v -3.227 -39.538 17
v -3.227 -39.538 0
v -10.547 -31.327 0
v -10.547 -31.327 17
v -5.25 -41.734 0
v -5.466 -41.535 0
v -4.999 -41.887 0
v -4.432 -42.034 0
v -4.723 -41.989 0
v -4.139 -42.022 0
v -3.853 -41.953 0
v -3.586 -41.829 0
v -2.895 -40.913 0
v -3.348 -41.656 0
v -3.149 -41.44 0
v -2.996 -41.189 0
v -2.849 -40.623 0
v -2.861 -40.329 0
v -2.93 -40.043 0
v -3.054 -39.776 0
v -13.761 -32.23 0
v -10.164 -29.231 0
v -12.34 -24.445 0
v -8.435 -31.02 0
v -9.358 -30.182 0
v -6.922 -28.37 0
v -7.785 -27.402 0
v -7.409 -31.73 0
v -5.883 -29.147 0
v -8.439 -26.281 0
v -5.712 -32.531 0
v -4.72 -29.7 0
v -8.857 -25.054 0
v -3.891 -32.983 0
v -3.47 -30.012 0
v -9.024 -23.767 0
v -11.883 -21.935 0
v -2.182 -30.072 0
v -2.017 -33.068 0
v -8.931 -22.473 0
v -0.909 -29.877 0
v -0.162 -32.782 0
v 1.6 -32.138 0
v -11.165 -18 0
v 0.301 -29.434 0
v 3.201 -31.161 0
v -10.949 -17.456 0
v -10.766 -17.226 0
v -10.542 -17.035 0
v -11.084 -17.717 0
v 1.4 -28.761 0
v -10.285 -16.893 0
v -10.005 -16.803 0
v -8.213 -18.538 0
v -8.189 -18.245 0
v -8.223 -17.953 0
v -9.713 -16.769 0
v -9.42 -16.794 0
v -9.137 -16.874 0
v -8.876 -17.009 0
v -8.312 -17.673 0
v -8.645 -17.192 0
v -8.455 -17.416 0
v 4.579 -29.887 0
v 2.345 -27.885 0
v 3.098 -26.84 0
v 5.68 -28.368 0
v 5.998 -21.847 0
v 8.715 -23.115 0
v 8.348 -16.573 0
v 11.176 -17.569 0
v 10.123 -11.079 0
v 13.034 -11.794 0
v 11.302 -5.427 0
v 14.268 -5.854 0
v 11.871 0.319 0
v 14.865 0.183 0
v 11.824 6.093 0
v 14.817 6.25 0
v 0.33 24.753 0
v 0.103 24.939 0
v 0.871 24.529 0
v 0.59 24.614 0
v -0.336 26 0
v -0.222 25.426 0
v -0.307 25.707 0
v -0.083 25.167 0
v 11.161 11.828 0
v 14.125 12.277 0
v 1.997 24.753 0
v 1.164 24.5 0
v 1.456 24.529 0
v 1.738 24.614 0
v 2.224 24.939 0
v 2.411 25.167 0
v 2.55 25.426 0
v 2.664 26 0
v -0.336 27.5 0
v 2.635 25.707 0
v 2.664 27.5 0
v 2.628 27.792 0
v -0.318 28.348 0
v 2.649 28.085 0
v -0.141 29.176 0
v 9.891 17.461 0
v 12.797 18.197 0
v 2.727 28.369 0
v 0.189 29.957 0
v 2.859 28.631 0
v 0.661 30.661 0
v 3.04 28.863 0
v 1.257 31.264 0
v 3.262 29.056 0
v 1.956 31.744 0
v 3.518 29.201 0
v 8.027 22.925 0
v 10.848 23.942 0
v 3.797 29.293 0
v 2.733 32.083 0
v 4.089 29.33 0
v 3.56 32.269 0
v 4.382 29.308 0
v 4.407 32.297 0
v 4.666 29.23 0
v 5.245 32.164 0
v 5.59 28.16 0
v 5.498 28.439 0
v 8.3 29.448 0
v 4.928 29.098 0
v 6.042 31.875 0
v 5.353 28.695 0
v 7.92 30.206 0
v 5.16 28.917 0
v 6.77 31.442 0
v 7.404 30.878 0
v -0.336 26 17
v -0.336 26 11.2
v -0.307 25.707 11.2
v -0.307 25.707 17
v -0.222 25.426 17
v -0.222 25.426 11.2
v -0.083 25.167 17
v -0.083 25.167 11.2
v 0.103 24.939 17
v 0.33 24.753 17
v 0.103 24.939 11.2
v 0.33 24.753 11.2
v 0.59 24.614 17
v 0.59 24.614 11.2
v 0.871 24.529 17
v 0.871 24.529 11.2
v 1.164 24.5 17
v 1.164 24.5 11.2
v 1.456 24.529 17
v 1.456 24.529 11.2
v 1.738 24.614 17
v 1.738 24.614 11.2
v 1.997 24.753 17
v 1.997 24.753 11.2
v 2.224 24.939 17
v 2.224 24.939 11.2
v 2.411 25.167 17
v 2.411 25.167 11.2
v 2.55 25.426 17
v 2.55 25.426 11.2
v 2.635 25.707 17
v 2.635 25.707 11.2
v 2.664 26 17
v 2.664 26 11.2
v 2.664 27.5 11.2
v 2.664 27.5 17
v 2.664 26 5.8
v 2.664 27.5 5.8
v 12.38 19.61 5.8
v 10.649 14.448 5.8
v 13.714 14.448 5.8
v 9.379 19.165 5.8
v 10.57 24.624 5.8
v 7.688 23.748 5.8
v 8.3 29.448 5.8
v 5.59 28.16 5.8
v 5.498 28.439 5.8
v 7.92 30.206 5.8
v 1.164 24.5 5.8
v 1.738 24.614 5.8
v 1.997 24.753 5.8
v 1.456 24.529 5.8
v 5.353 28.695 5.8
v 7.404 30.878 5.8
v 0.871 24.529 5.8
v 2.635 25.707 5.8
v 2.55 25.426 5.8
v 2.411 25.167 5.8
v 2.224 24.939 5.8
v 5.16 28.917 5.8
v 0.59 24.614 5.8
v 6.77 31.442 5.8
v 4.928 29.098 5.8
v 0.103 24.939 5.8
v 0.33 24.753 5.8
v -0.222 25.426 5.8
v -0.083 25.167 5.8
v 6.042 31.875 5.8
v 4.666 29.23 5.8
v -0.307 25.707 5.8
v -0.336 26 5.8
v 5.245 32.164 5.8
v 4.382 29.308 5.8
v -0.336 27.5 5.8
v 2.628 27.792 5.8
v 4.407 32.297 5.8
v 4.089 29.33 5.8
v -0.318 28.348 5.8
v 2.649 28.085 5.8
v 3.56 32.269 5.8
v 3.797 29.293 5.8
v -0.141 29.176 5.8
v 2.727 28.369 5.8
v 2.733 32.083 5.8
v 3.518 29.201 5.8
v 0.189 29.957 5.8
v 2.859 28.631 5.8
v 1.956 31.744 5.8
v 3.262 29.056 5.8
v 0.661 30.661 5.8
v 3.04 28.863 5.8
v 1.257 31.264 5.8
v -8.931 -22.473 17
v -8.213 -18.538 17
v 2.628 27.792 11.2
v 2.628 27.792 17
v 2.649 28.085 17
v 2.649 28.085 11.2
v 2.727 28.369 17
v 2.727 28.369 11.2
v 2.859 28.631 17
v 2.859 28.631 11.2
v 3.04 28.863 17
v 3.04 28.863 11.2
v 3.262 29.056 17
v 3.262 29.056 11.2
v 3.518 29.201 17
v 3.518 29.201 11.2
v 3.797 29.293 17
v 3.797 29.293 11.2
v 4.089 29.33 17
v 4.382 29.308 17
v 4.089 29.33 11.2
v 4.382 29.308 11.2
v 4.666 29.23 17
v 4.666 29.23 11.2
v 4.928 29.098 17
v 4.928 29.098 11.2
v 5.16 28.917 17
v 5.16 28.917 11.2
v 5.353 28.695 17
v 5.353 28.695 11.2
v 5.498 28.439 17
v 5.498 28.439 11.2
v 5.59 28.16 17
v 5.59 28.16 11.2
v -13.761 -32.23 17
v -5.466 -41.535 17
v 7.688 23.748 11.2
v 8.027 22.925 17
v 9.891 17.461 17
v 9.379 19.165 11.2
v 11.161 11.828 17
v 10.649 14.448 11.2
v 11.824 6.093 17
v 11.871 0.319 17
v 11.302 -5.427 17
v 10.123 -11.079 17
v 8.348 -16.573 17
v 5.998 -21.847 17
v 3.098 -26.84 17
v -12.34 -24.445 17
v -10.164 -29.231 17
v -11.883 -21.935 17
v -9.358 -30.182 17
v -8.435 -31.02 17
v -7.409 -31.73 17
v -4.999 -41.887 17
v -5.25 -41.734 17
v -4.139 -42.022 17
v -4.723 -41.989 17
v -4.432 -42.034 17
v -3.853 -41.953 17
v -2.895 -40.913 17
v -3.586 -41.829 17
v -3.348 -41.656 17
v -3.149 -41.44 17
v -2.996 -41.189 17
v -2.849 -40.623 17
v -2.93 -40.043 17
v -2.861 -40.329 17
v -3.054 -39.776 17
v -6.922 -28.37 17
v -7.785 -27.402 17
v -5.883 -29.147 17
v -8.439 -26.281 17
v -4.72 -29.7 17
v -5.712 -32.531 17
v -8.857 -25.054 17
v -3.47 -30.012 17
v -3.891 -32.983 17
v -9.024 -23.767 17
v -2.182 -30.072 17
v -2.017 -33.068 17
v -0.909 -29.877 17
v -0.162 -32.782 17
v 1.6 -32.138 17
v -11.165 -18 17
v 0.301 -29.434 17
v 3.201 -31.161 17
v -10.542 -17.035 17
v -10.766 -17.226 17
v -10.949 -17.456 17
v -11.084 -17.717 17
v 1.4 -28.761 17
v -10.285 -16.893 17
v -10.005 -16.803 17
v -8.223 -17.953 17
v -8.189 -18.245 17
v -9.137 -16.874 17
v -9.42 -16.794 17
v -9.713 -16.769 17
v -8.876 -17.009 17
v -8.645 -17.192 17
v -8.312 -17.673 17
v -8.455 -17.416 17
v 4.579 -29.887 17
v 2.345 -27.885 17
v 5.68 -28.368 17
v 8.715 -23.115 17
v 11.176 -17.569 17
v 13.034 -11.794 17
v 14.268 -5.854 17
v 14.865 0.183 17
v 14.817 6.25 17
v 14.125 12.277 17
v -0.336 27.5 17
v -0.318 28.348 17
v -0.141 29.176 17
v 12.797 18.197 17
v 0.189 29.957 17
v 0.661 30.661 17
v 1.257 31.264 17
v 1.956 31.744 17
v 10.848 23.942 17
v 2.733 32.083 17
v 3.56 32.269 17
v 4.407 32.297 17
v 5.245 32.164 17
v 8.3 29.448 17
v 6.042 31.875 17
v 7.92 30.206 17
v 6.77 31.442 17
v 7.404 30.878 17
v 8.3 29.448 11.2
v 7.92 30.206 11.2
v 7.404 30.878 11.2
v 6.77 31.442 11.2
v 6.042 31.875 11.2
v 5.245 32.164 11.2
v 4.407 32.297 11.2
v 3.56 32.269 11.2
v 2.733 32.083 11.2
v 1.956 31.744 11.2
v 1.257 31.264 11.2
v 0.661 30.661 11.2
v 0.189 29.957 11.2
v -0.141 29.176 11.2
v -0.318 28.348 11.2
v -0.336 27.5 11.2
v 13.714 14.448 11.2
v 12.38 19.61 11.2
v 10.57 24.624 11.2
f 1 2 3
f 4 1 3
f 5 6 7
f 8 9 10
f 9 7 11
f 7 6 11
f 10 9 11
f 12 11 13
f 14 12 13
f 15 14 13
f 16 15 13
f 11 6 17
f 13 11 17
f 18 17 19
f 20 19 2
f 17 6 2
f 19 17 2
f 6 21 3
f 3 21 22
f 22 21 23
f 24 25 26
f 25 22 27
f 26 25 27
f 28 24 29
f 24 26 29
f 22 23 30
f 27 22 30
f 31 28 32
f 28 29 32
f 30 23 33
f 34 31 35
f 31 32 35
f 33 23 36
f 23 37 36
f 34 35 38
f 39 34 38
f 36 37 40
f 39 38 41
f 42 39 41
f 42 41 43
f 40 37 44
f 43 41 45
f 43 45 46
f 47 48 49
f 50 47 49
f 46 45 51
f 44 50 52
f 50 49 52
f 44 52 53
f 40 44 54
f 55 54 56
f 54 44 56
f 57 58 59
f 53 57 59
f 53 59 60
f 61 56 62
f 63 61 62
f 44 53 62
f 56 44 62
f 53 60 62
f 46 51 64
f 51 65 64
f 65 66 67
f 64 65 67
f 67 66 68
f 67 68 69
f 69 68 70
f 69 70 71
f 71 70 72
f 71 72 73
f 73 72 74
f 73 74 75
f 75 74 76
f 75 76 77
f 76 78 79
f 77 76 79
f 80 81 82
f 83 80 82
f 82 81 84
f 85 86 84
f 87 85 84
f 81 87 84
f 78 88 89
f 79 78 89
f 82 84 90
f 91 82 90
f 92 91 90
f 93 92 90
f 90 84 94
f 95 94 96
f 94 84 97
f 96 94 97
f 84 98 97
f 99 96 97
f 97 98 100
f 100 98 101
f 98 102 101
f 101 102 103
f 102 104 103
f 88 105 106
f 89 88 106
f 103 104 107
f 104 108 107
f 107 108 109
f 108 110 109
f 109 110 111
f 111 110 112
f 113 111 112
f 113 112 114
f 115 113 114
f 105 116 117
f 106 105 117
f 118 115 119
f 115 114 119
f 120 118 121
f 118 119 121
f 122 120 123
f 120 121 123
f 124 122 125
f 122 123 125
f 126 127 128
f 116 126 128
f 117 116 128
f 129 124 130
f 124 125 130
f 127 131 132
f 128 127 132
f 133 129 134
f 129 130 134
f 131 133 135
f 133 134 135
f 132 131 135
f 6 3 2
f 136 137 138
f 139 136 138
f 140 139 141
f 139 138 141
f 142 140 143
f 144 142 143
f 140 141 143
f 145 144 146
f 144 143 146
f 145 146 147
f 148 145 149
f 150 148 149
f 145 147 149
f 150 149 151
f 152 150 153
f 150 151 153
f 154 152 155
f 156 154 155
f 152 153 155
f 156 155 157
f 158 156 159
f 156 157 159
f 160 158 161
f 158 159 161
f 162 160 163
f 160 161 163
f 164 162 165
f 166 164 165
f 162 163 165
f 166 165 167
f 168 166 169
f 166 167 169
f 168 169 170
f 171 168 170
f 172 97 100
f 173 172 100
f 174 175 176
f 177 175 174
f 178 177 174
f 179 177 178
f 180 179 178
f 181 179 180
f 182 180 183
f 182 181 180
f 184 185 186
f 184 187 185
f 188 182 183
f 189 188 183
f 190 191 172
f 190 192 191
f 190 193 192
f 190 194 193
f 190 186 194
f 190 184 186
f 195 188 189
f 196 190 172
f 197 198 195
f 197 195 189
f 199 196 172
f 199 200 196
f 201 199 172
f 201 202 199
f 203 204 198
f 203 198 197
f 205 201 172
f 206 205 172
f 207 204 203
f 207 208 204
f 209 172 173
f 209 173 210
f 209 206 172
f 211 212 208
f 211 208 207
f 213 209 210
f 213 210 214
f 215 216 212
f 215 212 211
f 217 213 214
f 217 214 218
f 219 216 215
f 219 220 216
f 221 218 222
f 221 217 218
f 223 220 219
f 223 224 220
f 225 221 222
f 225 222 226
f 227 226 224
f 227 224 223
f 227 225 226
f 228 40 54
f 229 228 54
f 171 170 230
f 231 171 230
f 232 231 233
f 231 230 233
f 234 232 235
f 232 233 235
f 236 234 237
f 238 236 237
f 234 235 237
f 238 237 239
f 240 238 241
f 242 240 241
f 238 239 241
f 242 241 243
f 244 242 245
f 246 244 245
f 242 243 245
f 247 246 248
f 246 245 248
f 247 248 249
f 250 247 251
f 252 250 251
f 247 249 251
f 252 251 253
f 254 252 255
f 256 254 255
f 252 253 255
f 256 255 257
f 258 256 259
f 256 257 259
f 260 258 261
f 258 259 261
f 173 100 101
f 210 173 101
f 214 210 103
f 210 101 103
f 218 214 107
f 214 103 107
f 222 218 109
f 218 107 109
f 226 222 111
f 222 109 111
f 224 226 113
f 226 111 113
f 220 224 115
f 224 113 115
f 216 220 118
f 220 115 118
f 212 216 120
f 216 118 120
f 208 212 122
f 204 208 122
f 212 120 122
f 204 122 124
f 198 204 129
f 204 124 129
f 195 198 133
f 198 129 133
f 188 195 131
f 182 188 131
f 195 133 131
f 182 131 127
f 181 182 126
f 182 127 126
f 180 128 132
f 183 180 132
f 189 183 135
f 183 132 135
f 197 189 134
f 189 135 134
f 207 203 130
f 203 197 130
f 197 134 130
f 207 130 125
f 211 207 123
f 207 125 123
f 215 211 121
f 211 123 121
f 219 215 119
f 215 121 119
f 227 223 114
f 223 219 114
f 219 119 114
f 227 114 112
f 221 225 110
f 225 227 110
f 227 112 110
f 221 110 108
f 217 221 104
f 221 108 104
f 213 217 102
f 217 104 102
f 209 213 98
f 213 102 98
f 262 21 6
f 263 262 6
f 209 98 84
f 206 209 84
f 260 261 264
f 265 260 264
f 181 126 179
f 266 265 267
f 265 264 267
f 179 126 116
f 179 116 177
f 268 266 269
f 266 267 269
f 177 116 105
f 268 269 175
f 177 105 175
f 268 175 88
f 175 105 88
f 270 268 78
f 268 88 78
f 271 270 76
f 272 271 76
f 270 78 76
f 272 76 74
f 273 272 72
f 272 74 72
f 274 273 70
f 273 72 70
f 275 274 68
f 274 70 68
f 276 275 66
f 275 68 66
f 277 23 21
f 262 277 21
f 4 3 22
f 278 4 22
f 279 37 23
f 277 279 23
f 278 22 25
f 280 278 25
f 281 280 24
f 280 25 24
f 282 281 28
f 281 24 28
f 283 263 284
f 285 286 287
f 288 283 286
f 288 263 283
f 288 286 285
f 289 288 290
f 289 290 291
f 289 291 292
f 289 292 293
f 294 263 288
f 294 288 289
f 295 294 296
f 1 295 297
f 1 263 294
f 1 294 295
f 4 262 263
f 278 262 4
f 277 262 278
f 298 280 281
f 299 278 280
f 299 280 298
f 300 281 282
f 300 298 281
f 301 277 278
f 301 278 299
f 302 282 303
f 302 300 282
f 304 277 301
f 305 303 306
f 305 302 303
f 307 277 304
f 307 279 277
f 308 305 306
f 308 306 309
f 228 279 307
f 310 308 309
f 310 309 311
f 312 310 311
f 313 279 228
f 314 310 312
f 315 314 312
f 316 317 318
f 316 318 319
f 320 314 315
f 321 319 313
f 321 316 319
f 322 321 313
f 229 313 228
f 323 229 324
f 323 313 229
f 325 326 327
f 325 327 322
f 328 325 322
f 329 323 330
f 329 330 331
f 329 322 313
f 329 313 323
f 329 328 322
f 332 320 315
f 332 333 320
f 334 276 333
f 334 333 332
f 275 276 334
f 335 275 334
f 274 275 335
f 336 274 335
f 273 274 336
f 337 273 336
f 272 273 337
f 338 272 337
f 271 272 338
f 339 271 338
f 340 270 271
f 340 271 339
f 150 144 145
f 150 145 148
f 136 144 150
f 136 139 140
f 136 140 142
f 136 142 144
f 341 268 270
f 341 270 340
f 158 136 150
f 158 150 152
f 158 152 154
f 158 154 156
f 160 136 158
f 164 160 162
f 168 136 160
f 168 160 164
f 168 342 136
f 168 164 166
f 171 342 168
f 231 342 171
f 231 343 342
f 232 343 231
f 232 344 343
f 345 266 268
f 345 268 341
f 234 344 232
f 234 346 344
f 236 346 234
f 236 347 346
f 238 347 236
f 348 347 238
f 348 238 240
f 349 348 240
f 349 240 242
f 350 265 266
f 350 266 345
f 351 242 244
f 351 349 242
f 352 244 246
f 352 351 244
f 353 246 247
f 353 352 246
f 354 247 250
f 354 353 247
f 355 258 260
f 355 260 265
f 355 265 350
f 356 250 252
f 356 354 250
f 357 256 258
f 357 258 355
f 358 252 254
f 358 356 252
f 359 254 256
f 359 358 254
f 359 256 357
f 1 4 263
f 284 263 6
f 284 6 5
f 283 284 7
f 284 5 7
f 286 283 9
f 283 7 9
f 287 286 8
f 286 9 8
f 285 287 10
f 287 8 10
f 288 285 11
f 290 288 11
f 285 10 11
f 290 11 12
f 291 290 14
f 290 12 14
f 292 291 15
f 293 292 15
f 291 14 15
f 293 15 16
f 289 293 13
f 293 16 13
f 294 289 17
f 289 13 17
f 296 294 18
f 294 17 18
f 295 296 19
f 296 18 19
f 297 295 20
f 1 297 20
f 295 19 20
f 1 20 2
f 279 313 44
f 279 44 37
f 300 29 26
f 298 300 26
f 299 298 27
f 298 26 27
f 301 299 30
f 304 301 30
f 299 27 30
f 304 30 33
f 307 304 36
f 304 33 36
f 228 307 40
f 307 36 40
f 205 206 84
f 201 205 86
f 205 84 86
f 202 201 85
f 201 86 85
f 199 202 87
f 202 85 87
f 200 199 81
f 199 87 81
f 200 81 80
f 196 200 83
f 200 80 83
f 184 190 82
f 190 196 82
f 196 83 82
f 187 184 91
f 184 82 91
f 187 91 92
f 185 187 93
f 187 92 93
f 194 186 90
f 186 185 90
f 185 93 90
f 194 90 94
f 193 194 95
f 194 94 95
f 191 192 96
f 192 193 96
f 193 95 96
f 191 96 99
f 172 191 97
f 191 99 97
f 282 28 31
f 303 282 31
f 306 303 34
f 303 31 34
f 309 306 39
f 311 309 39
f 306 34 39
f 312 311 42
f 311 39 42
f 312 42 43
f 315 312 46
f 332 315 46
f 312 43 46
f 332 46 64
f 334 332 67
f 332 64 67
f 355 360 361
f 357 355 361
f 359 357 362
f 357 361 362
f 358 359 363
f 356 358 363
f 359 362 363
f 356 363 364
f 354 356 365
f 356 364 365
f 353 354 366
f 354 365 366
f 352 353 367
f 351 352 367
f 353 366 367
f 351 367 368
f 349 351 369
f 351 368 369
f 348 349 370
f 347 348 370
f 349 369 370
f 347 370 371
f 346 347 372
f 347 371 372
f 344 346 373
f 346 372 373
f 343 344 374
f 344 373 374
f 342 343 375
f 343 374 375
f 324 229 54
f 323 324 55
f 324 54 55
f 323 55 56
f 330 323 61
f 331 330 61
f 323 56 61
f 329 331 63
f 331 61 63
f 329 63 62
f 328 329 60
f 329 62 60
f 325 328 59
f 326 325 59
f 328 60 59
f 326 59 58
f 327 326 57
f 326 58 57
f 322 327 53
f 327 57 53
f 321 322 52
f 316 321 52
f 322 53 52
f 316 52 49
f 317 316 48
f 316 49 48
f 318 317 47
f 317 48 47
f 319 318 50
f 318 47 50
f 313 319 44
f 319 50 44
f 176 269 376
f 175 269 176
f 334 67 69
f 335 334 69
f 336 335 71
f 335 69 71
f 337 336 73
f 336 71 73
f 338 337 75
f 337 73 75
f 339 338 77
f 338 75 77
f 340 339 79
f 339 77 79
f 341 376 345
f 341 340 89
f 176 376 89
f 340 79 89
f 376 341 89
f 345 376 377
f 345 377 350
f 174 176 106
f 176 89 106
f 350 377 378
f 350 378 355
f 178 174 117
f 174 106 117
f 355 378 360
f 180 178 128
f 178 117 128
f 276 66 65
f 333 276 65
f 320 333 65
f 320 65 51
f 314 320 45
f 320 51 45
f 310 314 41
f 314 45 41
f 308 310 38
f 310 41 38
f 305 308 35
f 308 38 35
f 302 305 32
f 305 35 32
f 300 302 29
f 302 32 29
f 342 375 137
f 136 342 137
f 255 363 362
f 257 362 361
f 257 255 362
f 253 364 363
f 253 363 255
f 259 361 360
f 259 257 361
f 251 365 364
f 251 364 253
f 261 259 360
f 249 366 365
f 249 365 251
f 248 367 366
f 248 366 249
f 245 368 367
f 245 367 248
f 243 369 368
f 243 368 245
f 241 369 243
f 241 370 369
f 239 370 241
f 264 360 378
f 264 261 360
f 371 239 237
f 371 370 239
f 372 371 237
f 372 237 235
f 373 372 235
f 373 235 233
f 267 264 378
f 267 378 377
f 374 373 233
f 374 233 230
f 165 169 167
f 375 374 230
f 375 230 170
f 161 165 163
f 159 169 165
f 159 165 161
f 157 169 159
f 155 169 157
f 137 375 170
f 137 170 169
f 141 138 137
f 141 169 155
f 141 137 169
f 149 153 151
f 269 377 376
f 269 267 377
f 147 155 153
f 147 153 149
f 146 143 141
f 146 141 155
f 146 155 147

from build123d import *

# Parameters (mm, degrees)
F1_DEPTH      = 17
F3_DEPTH      = 150
F3_DEPTH_BACK = 25


with BuildPart() as f1:
    # F0 (on Top) → F1 (new body)
    with BuildSketch(Plane.XY):
        with BuildLine():
            Line((-11.8825086199, -21.935047995), (-8.9312226237, -22.4734818057))
            Line((-8.9312226237, -22.4734818057), (-8.213310876, -18.5384338107))
            ThreePointArc((-8.213310876, -18.5384338107), (-9.4197369687, -16.7935739073), (-11.1645968722, -18))
            Line((-11.1645968722, -18), (-11.8825086199, -21.935047995))
        make_face()
        with BuildLine():
            ThreePointArc((2.6638383122, 27.5), (3.7969927434, 29.2933099796), (5.5903028117, 28.1601556887))
            ThreePointArc((5.5903028117, 28.1601556887), (11.8707301214, 0.3190753529), (3.0978968201, -26.8398443113))
            ThreePointArc((3.0978968201, -26.8398443113), (-0.908917448, -29.8768455436), (-5.8834154579, -29.1472520849))
            Line((-5.8834154579, -29.1472520849), (-7.4091766717, -31.7302837762))
            ThreePointArc((-7.4091766717, -31.7302837762), (-0.162444822, -32.7824020899), (5.6797630841, -28.3675768125))
            ThreePointArc((5.6797630841, -28.3675768125), (14.8647434728, 0.183397229), (8.2997657894, 29.4481038135))
            ThreePointArc((8.2997657894, 29.4481038135), (3.1422456973, 32.1957980128), (-0.3361616878, 27.5))
            Line((-0.3361616878, 27.5), (-0.3361616878, 26))
            ThreePointArc((-0.3361616878, 26), (1.1638383122, 24.5), (2.6638383122, 26))
            Line((2.6638383122, 26), (2.6638383122, 27.5))
        make_face()
        with BuildLine():
            Line((-10.5465240559, -31.3273397943), (-10.1639891219, -29.2305732632))
            ThreePointArc((-10.1639891219, -29.2305732632), (-11.7731559311, -25.7594572525), (-11.8825086199, -21.935047995))
            Line((-11.8825086199, -21.935047995), (-12.3404061236, -24.444895006))
            Line((-12.3404061236, -24.444895006), (-13.7607384363, -32.2300800757))
            Line((-13.7607384363, -32.2300800757), (-5.4662183221, -41.5347142683))
            ThreePointArc((-5.4662183221, -41.5347142683), (-3.3483834547, -41.6562686781), (-3.2268290449, -39.5384338107))
            Line((-3.2268290449, -39.5384338107), (-10.5465240559, -31.3273397943))
        make_face()
        with BuildLine():
            Line((-7.4091766717, -31.7302837762), (-5.8834154579, -29.1472520849))
            ThreePointArc((-5.8834154579, -29.1472520849), (-8.4389300147, -26.2814876442), (-8.9312226237, -22.4734818057))
            Line((-8.9312226237, -22.4734818057), (-10.1639891219, -29.2305732632))
            ThreePointArc((-10.1639891219, -29.2305732632), (-8.9101299966, -30.6165839213), (-7.4091766717, -31.7302837762))
        make_face()
        with BuildLine():
            Line((-10.1639891219, -29.2305732632), (-8.9312226237, -22.4734818057))
            Line((-8.9312226237, -22.4734818057), (-11.8825086199, -21.935047995))
            ThreePointArc((-11.8825086199, -21.935047995), (-11.7731559311, -25.7594572525), (-10.1639891219, -29.2305732632))
        make_face()
    extrude(amount=F1_DEPTH)

    # F2 (on Right) → F3 (cut, two sides)
    with BuildSketch(Plane.YZ) as f3_sk:
        Polygon((49.3275342038, 11.2), (28.4481038135, 11.2), (14.4481038135, 11.2), (14.4481038135, 5.8), (49.3275342038, 5.8), align=None)
    extrude(amount=-F3_DEPTH, mode=Mode.SUBTRACT)
    extrude(f3_sk.sketch, amount=F3_DEPTH_BACK, mode=Mode.SUBTRACT)


solid = f1.part
